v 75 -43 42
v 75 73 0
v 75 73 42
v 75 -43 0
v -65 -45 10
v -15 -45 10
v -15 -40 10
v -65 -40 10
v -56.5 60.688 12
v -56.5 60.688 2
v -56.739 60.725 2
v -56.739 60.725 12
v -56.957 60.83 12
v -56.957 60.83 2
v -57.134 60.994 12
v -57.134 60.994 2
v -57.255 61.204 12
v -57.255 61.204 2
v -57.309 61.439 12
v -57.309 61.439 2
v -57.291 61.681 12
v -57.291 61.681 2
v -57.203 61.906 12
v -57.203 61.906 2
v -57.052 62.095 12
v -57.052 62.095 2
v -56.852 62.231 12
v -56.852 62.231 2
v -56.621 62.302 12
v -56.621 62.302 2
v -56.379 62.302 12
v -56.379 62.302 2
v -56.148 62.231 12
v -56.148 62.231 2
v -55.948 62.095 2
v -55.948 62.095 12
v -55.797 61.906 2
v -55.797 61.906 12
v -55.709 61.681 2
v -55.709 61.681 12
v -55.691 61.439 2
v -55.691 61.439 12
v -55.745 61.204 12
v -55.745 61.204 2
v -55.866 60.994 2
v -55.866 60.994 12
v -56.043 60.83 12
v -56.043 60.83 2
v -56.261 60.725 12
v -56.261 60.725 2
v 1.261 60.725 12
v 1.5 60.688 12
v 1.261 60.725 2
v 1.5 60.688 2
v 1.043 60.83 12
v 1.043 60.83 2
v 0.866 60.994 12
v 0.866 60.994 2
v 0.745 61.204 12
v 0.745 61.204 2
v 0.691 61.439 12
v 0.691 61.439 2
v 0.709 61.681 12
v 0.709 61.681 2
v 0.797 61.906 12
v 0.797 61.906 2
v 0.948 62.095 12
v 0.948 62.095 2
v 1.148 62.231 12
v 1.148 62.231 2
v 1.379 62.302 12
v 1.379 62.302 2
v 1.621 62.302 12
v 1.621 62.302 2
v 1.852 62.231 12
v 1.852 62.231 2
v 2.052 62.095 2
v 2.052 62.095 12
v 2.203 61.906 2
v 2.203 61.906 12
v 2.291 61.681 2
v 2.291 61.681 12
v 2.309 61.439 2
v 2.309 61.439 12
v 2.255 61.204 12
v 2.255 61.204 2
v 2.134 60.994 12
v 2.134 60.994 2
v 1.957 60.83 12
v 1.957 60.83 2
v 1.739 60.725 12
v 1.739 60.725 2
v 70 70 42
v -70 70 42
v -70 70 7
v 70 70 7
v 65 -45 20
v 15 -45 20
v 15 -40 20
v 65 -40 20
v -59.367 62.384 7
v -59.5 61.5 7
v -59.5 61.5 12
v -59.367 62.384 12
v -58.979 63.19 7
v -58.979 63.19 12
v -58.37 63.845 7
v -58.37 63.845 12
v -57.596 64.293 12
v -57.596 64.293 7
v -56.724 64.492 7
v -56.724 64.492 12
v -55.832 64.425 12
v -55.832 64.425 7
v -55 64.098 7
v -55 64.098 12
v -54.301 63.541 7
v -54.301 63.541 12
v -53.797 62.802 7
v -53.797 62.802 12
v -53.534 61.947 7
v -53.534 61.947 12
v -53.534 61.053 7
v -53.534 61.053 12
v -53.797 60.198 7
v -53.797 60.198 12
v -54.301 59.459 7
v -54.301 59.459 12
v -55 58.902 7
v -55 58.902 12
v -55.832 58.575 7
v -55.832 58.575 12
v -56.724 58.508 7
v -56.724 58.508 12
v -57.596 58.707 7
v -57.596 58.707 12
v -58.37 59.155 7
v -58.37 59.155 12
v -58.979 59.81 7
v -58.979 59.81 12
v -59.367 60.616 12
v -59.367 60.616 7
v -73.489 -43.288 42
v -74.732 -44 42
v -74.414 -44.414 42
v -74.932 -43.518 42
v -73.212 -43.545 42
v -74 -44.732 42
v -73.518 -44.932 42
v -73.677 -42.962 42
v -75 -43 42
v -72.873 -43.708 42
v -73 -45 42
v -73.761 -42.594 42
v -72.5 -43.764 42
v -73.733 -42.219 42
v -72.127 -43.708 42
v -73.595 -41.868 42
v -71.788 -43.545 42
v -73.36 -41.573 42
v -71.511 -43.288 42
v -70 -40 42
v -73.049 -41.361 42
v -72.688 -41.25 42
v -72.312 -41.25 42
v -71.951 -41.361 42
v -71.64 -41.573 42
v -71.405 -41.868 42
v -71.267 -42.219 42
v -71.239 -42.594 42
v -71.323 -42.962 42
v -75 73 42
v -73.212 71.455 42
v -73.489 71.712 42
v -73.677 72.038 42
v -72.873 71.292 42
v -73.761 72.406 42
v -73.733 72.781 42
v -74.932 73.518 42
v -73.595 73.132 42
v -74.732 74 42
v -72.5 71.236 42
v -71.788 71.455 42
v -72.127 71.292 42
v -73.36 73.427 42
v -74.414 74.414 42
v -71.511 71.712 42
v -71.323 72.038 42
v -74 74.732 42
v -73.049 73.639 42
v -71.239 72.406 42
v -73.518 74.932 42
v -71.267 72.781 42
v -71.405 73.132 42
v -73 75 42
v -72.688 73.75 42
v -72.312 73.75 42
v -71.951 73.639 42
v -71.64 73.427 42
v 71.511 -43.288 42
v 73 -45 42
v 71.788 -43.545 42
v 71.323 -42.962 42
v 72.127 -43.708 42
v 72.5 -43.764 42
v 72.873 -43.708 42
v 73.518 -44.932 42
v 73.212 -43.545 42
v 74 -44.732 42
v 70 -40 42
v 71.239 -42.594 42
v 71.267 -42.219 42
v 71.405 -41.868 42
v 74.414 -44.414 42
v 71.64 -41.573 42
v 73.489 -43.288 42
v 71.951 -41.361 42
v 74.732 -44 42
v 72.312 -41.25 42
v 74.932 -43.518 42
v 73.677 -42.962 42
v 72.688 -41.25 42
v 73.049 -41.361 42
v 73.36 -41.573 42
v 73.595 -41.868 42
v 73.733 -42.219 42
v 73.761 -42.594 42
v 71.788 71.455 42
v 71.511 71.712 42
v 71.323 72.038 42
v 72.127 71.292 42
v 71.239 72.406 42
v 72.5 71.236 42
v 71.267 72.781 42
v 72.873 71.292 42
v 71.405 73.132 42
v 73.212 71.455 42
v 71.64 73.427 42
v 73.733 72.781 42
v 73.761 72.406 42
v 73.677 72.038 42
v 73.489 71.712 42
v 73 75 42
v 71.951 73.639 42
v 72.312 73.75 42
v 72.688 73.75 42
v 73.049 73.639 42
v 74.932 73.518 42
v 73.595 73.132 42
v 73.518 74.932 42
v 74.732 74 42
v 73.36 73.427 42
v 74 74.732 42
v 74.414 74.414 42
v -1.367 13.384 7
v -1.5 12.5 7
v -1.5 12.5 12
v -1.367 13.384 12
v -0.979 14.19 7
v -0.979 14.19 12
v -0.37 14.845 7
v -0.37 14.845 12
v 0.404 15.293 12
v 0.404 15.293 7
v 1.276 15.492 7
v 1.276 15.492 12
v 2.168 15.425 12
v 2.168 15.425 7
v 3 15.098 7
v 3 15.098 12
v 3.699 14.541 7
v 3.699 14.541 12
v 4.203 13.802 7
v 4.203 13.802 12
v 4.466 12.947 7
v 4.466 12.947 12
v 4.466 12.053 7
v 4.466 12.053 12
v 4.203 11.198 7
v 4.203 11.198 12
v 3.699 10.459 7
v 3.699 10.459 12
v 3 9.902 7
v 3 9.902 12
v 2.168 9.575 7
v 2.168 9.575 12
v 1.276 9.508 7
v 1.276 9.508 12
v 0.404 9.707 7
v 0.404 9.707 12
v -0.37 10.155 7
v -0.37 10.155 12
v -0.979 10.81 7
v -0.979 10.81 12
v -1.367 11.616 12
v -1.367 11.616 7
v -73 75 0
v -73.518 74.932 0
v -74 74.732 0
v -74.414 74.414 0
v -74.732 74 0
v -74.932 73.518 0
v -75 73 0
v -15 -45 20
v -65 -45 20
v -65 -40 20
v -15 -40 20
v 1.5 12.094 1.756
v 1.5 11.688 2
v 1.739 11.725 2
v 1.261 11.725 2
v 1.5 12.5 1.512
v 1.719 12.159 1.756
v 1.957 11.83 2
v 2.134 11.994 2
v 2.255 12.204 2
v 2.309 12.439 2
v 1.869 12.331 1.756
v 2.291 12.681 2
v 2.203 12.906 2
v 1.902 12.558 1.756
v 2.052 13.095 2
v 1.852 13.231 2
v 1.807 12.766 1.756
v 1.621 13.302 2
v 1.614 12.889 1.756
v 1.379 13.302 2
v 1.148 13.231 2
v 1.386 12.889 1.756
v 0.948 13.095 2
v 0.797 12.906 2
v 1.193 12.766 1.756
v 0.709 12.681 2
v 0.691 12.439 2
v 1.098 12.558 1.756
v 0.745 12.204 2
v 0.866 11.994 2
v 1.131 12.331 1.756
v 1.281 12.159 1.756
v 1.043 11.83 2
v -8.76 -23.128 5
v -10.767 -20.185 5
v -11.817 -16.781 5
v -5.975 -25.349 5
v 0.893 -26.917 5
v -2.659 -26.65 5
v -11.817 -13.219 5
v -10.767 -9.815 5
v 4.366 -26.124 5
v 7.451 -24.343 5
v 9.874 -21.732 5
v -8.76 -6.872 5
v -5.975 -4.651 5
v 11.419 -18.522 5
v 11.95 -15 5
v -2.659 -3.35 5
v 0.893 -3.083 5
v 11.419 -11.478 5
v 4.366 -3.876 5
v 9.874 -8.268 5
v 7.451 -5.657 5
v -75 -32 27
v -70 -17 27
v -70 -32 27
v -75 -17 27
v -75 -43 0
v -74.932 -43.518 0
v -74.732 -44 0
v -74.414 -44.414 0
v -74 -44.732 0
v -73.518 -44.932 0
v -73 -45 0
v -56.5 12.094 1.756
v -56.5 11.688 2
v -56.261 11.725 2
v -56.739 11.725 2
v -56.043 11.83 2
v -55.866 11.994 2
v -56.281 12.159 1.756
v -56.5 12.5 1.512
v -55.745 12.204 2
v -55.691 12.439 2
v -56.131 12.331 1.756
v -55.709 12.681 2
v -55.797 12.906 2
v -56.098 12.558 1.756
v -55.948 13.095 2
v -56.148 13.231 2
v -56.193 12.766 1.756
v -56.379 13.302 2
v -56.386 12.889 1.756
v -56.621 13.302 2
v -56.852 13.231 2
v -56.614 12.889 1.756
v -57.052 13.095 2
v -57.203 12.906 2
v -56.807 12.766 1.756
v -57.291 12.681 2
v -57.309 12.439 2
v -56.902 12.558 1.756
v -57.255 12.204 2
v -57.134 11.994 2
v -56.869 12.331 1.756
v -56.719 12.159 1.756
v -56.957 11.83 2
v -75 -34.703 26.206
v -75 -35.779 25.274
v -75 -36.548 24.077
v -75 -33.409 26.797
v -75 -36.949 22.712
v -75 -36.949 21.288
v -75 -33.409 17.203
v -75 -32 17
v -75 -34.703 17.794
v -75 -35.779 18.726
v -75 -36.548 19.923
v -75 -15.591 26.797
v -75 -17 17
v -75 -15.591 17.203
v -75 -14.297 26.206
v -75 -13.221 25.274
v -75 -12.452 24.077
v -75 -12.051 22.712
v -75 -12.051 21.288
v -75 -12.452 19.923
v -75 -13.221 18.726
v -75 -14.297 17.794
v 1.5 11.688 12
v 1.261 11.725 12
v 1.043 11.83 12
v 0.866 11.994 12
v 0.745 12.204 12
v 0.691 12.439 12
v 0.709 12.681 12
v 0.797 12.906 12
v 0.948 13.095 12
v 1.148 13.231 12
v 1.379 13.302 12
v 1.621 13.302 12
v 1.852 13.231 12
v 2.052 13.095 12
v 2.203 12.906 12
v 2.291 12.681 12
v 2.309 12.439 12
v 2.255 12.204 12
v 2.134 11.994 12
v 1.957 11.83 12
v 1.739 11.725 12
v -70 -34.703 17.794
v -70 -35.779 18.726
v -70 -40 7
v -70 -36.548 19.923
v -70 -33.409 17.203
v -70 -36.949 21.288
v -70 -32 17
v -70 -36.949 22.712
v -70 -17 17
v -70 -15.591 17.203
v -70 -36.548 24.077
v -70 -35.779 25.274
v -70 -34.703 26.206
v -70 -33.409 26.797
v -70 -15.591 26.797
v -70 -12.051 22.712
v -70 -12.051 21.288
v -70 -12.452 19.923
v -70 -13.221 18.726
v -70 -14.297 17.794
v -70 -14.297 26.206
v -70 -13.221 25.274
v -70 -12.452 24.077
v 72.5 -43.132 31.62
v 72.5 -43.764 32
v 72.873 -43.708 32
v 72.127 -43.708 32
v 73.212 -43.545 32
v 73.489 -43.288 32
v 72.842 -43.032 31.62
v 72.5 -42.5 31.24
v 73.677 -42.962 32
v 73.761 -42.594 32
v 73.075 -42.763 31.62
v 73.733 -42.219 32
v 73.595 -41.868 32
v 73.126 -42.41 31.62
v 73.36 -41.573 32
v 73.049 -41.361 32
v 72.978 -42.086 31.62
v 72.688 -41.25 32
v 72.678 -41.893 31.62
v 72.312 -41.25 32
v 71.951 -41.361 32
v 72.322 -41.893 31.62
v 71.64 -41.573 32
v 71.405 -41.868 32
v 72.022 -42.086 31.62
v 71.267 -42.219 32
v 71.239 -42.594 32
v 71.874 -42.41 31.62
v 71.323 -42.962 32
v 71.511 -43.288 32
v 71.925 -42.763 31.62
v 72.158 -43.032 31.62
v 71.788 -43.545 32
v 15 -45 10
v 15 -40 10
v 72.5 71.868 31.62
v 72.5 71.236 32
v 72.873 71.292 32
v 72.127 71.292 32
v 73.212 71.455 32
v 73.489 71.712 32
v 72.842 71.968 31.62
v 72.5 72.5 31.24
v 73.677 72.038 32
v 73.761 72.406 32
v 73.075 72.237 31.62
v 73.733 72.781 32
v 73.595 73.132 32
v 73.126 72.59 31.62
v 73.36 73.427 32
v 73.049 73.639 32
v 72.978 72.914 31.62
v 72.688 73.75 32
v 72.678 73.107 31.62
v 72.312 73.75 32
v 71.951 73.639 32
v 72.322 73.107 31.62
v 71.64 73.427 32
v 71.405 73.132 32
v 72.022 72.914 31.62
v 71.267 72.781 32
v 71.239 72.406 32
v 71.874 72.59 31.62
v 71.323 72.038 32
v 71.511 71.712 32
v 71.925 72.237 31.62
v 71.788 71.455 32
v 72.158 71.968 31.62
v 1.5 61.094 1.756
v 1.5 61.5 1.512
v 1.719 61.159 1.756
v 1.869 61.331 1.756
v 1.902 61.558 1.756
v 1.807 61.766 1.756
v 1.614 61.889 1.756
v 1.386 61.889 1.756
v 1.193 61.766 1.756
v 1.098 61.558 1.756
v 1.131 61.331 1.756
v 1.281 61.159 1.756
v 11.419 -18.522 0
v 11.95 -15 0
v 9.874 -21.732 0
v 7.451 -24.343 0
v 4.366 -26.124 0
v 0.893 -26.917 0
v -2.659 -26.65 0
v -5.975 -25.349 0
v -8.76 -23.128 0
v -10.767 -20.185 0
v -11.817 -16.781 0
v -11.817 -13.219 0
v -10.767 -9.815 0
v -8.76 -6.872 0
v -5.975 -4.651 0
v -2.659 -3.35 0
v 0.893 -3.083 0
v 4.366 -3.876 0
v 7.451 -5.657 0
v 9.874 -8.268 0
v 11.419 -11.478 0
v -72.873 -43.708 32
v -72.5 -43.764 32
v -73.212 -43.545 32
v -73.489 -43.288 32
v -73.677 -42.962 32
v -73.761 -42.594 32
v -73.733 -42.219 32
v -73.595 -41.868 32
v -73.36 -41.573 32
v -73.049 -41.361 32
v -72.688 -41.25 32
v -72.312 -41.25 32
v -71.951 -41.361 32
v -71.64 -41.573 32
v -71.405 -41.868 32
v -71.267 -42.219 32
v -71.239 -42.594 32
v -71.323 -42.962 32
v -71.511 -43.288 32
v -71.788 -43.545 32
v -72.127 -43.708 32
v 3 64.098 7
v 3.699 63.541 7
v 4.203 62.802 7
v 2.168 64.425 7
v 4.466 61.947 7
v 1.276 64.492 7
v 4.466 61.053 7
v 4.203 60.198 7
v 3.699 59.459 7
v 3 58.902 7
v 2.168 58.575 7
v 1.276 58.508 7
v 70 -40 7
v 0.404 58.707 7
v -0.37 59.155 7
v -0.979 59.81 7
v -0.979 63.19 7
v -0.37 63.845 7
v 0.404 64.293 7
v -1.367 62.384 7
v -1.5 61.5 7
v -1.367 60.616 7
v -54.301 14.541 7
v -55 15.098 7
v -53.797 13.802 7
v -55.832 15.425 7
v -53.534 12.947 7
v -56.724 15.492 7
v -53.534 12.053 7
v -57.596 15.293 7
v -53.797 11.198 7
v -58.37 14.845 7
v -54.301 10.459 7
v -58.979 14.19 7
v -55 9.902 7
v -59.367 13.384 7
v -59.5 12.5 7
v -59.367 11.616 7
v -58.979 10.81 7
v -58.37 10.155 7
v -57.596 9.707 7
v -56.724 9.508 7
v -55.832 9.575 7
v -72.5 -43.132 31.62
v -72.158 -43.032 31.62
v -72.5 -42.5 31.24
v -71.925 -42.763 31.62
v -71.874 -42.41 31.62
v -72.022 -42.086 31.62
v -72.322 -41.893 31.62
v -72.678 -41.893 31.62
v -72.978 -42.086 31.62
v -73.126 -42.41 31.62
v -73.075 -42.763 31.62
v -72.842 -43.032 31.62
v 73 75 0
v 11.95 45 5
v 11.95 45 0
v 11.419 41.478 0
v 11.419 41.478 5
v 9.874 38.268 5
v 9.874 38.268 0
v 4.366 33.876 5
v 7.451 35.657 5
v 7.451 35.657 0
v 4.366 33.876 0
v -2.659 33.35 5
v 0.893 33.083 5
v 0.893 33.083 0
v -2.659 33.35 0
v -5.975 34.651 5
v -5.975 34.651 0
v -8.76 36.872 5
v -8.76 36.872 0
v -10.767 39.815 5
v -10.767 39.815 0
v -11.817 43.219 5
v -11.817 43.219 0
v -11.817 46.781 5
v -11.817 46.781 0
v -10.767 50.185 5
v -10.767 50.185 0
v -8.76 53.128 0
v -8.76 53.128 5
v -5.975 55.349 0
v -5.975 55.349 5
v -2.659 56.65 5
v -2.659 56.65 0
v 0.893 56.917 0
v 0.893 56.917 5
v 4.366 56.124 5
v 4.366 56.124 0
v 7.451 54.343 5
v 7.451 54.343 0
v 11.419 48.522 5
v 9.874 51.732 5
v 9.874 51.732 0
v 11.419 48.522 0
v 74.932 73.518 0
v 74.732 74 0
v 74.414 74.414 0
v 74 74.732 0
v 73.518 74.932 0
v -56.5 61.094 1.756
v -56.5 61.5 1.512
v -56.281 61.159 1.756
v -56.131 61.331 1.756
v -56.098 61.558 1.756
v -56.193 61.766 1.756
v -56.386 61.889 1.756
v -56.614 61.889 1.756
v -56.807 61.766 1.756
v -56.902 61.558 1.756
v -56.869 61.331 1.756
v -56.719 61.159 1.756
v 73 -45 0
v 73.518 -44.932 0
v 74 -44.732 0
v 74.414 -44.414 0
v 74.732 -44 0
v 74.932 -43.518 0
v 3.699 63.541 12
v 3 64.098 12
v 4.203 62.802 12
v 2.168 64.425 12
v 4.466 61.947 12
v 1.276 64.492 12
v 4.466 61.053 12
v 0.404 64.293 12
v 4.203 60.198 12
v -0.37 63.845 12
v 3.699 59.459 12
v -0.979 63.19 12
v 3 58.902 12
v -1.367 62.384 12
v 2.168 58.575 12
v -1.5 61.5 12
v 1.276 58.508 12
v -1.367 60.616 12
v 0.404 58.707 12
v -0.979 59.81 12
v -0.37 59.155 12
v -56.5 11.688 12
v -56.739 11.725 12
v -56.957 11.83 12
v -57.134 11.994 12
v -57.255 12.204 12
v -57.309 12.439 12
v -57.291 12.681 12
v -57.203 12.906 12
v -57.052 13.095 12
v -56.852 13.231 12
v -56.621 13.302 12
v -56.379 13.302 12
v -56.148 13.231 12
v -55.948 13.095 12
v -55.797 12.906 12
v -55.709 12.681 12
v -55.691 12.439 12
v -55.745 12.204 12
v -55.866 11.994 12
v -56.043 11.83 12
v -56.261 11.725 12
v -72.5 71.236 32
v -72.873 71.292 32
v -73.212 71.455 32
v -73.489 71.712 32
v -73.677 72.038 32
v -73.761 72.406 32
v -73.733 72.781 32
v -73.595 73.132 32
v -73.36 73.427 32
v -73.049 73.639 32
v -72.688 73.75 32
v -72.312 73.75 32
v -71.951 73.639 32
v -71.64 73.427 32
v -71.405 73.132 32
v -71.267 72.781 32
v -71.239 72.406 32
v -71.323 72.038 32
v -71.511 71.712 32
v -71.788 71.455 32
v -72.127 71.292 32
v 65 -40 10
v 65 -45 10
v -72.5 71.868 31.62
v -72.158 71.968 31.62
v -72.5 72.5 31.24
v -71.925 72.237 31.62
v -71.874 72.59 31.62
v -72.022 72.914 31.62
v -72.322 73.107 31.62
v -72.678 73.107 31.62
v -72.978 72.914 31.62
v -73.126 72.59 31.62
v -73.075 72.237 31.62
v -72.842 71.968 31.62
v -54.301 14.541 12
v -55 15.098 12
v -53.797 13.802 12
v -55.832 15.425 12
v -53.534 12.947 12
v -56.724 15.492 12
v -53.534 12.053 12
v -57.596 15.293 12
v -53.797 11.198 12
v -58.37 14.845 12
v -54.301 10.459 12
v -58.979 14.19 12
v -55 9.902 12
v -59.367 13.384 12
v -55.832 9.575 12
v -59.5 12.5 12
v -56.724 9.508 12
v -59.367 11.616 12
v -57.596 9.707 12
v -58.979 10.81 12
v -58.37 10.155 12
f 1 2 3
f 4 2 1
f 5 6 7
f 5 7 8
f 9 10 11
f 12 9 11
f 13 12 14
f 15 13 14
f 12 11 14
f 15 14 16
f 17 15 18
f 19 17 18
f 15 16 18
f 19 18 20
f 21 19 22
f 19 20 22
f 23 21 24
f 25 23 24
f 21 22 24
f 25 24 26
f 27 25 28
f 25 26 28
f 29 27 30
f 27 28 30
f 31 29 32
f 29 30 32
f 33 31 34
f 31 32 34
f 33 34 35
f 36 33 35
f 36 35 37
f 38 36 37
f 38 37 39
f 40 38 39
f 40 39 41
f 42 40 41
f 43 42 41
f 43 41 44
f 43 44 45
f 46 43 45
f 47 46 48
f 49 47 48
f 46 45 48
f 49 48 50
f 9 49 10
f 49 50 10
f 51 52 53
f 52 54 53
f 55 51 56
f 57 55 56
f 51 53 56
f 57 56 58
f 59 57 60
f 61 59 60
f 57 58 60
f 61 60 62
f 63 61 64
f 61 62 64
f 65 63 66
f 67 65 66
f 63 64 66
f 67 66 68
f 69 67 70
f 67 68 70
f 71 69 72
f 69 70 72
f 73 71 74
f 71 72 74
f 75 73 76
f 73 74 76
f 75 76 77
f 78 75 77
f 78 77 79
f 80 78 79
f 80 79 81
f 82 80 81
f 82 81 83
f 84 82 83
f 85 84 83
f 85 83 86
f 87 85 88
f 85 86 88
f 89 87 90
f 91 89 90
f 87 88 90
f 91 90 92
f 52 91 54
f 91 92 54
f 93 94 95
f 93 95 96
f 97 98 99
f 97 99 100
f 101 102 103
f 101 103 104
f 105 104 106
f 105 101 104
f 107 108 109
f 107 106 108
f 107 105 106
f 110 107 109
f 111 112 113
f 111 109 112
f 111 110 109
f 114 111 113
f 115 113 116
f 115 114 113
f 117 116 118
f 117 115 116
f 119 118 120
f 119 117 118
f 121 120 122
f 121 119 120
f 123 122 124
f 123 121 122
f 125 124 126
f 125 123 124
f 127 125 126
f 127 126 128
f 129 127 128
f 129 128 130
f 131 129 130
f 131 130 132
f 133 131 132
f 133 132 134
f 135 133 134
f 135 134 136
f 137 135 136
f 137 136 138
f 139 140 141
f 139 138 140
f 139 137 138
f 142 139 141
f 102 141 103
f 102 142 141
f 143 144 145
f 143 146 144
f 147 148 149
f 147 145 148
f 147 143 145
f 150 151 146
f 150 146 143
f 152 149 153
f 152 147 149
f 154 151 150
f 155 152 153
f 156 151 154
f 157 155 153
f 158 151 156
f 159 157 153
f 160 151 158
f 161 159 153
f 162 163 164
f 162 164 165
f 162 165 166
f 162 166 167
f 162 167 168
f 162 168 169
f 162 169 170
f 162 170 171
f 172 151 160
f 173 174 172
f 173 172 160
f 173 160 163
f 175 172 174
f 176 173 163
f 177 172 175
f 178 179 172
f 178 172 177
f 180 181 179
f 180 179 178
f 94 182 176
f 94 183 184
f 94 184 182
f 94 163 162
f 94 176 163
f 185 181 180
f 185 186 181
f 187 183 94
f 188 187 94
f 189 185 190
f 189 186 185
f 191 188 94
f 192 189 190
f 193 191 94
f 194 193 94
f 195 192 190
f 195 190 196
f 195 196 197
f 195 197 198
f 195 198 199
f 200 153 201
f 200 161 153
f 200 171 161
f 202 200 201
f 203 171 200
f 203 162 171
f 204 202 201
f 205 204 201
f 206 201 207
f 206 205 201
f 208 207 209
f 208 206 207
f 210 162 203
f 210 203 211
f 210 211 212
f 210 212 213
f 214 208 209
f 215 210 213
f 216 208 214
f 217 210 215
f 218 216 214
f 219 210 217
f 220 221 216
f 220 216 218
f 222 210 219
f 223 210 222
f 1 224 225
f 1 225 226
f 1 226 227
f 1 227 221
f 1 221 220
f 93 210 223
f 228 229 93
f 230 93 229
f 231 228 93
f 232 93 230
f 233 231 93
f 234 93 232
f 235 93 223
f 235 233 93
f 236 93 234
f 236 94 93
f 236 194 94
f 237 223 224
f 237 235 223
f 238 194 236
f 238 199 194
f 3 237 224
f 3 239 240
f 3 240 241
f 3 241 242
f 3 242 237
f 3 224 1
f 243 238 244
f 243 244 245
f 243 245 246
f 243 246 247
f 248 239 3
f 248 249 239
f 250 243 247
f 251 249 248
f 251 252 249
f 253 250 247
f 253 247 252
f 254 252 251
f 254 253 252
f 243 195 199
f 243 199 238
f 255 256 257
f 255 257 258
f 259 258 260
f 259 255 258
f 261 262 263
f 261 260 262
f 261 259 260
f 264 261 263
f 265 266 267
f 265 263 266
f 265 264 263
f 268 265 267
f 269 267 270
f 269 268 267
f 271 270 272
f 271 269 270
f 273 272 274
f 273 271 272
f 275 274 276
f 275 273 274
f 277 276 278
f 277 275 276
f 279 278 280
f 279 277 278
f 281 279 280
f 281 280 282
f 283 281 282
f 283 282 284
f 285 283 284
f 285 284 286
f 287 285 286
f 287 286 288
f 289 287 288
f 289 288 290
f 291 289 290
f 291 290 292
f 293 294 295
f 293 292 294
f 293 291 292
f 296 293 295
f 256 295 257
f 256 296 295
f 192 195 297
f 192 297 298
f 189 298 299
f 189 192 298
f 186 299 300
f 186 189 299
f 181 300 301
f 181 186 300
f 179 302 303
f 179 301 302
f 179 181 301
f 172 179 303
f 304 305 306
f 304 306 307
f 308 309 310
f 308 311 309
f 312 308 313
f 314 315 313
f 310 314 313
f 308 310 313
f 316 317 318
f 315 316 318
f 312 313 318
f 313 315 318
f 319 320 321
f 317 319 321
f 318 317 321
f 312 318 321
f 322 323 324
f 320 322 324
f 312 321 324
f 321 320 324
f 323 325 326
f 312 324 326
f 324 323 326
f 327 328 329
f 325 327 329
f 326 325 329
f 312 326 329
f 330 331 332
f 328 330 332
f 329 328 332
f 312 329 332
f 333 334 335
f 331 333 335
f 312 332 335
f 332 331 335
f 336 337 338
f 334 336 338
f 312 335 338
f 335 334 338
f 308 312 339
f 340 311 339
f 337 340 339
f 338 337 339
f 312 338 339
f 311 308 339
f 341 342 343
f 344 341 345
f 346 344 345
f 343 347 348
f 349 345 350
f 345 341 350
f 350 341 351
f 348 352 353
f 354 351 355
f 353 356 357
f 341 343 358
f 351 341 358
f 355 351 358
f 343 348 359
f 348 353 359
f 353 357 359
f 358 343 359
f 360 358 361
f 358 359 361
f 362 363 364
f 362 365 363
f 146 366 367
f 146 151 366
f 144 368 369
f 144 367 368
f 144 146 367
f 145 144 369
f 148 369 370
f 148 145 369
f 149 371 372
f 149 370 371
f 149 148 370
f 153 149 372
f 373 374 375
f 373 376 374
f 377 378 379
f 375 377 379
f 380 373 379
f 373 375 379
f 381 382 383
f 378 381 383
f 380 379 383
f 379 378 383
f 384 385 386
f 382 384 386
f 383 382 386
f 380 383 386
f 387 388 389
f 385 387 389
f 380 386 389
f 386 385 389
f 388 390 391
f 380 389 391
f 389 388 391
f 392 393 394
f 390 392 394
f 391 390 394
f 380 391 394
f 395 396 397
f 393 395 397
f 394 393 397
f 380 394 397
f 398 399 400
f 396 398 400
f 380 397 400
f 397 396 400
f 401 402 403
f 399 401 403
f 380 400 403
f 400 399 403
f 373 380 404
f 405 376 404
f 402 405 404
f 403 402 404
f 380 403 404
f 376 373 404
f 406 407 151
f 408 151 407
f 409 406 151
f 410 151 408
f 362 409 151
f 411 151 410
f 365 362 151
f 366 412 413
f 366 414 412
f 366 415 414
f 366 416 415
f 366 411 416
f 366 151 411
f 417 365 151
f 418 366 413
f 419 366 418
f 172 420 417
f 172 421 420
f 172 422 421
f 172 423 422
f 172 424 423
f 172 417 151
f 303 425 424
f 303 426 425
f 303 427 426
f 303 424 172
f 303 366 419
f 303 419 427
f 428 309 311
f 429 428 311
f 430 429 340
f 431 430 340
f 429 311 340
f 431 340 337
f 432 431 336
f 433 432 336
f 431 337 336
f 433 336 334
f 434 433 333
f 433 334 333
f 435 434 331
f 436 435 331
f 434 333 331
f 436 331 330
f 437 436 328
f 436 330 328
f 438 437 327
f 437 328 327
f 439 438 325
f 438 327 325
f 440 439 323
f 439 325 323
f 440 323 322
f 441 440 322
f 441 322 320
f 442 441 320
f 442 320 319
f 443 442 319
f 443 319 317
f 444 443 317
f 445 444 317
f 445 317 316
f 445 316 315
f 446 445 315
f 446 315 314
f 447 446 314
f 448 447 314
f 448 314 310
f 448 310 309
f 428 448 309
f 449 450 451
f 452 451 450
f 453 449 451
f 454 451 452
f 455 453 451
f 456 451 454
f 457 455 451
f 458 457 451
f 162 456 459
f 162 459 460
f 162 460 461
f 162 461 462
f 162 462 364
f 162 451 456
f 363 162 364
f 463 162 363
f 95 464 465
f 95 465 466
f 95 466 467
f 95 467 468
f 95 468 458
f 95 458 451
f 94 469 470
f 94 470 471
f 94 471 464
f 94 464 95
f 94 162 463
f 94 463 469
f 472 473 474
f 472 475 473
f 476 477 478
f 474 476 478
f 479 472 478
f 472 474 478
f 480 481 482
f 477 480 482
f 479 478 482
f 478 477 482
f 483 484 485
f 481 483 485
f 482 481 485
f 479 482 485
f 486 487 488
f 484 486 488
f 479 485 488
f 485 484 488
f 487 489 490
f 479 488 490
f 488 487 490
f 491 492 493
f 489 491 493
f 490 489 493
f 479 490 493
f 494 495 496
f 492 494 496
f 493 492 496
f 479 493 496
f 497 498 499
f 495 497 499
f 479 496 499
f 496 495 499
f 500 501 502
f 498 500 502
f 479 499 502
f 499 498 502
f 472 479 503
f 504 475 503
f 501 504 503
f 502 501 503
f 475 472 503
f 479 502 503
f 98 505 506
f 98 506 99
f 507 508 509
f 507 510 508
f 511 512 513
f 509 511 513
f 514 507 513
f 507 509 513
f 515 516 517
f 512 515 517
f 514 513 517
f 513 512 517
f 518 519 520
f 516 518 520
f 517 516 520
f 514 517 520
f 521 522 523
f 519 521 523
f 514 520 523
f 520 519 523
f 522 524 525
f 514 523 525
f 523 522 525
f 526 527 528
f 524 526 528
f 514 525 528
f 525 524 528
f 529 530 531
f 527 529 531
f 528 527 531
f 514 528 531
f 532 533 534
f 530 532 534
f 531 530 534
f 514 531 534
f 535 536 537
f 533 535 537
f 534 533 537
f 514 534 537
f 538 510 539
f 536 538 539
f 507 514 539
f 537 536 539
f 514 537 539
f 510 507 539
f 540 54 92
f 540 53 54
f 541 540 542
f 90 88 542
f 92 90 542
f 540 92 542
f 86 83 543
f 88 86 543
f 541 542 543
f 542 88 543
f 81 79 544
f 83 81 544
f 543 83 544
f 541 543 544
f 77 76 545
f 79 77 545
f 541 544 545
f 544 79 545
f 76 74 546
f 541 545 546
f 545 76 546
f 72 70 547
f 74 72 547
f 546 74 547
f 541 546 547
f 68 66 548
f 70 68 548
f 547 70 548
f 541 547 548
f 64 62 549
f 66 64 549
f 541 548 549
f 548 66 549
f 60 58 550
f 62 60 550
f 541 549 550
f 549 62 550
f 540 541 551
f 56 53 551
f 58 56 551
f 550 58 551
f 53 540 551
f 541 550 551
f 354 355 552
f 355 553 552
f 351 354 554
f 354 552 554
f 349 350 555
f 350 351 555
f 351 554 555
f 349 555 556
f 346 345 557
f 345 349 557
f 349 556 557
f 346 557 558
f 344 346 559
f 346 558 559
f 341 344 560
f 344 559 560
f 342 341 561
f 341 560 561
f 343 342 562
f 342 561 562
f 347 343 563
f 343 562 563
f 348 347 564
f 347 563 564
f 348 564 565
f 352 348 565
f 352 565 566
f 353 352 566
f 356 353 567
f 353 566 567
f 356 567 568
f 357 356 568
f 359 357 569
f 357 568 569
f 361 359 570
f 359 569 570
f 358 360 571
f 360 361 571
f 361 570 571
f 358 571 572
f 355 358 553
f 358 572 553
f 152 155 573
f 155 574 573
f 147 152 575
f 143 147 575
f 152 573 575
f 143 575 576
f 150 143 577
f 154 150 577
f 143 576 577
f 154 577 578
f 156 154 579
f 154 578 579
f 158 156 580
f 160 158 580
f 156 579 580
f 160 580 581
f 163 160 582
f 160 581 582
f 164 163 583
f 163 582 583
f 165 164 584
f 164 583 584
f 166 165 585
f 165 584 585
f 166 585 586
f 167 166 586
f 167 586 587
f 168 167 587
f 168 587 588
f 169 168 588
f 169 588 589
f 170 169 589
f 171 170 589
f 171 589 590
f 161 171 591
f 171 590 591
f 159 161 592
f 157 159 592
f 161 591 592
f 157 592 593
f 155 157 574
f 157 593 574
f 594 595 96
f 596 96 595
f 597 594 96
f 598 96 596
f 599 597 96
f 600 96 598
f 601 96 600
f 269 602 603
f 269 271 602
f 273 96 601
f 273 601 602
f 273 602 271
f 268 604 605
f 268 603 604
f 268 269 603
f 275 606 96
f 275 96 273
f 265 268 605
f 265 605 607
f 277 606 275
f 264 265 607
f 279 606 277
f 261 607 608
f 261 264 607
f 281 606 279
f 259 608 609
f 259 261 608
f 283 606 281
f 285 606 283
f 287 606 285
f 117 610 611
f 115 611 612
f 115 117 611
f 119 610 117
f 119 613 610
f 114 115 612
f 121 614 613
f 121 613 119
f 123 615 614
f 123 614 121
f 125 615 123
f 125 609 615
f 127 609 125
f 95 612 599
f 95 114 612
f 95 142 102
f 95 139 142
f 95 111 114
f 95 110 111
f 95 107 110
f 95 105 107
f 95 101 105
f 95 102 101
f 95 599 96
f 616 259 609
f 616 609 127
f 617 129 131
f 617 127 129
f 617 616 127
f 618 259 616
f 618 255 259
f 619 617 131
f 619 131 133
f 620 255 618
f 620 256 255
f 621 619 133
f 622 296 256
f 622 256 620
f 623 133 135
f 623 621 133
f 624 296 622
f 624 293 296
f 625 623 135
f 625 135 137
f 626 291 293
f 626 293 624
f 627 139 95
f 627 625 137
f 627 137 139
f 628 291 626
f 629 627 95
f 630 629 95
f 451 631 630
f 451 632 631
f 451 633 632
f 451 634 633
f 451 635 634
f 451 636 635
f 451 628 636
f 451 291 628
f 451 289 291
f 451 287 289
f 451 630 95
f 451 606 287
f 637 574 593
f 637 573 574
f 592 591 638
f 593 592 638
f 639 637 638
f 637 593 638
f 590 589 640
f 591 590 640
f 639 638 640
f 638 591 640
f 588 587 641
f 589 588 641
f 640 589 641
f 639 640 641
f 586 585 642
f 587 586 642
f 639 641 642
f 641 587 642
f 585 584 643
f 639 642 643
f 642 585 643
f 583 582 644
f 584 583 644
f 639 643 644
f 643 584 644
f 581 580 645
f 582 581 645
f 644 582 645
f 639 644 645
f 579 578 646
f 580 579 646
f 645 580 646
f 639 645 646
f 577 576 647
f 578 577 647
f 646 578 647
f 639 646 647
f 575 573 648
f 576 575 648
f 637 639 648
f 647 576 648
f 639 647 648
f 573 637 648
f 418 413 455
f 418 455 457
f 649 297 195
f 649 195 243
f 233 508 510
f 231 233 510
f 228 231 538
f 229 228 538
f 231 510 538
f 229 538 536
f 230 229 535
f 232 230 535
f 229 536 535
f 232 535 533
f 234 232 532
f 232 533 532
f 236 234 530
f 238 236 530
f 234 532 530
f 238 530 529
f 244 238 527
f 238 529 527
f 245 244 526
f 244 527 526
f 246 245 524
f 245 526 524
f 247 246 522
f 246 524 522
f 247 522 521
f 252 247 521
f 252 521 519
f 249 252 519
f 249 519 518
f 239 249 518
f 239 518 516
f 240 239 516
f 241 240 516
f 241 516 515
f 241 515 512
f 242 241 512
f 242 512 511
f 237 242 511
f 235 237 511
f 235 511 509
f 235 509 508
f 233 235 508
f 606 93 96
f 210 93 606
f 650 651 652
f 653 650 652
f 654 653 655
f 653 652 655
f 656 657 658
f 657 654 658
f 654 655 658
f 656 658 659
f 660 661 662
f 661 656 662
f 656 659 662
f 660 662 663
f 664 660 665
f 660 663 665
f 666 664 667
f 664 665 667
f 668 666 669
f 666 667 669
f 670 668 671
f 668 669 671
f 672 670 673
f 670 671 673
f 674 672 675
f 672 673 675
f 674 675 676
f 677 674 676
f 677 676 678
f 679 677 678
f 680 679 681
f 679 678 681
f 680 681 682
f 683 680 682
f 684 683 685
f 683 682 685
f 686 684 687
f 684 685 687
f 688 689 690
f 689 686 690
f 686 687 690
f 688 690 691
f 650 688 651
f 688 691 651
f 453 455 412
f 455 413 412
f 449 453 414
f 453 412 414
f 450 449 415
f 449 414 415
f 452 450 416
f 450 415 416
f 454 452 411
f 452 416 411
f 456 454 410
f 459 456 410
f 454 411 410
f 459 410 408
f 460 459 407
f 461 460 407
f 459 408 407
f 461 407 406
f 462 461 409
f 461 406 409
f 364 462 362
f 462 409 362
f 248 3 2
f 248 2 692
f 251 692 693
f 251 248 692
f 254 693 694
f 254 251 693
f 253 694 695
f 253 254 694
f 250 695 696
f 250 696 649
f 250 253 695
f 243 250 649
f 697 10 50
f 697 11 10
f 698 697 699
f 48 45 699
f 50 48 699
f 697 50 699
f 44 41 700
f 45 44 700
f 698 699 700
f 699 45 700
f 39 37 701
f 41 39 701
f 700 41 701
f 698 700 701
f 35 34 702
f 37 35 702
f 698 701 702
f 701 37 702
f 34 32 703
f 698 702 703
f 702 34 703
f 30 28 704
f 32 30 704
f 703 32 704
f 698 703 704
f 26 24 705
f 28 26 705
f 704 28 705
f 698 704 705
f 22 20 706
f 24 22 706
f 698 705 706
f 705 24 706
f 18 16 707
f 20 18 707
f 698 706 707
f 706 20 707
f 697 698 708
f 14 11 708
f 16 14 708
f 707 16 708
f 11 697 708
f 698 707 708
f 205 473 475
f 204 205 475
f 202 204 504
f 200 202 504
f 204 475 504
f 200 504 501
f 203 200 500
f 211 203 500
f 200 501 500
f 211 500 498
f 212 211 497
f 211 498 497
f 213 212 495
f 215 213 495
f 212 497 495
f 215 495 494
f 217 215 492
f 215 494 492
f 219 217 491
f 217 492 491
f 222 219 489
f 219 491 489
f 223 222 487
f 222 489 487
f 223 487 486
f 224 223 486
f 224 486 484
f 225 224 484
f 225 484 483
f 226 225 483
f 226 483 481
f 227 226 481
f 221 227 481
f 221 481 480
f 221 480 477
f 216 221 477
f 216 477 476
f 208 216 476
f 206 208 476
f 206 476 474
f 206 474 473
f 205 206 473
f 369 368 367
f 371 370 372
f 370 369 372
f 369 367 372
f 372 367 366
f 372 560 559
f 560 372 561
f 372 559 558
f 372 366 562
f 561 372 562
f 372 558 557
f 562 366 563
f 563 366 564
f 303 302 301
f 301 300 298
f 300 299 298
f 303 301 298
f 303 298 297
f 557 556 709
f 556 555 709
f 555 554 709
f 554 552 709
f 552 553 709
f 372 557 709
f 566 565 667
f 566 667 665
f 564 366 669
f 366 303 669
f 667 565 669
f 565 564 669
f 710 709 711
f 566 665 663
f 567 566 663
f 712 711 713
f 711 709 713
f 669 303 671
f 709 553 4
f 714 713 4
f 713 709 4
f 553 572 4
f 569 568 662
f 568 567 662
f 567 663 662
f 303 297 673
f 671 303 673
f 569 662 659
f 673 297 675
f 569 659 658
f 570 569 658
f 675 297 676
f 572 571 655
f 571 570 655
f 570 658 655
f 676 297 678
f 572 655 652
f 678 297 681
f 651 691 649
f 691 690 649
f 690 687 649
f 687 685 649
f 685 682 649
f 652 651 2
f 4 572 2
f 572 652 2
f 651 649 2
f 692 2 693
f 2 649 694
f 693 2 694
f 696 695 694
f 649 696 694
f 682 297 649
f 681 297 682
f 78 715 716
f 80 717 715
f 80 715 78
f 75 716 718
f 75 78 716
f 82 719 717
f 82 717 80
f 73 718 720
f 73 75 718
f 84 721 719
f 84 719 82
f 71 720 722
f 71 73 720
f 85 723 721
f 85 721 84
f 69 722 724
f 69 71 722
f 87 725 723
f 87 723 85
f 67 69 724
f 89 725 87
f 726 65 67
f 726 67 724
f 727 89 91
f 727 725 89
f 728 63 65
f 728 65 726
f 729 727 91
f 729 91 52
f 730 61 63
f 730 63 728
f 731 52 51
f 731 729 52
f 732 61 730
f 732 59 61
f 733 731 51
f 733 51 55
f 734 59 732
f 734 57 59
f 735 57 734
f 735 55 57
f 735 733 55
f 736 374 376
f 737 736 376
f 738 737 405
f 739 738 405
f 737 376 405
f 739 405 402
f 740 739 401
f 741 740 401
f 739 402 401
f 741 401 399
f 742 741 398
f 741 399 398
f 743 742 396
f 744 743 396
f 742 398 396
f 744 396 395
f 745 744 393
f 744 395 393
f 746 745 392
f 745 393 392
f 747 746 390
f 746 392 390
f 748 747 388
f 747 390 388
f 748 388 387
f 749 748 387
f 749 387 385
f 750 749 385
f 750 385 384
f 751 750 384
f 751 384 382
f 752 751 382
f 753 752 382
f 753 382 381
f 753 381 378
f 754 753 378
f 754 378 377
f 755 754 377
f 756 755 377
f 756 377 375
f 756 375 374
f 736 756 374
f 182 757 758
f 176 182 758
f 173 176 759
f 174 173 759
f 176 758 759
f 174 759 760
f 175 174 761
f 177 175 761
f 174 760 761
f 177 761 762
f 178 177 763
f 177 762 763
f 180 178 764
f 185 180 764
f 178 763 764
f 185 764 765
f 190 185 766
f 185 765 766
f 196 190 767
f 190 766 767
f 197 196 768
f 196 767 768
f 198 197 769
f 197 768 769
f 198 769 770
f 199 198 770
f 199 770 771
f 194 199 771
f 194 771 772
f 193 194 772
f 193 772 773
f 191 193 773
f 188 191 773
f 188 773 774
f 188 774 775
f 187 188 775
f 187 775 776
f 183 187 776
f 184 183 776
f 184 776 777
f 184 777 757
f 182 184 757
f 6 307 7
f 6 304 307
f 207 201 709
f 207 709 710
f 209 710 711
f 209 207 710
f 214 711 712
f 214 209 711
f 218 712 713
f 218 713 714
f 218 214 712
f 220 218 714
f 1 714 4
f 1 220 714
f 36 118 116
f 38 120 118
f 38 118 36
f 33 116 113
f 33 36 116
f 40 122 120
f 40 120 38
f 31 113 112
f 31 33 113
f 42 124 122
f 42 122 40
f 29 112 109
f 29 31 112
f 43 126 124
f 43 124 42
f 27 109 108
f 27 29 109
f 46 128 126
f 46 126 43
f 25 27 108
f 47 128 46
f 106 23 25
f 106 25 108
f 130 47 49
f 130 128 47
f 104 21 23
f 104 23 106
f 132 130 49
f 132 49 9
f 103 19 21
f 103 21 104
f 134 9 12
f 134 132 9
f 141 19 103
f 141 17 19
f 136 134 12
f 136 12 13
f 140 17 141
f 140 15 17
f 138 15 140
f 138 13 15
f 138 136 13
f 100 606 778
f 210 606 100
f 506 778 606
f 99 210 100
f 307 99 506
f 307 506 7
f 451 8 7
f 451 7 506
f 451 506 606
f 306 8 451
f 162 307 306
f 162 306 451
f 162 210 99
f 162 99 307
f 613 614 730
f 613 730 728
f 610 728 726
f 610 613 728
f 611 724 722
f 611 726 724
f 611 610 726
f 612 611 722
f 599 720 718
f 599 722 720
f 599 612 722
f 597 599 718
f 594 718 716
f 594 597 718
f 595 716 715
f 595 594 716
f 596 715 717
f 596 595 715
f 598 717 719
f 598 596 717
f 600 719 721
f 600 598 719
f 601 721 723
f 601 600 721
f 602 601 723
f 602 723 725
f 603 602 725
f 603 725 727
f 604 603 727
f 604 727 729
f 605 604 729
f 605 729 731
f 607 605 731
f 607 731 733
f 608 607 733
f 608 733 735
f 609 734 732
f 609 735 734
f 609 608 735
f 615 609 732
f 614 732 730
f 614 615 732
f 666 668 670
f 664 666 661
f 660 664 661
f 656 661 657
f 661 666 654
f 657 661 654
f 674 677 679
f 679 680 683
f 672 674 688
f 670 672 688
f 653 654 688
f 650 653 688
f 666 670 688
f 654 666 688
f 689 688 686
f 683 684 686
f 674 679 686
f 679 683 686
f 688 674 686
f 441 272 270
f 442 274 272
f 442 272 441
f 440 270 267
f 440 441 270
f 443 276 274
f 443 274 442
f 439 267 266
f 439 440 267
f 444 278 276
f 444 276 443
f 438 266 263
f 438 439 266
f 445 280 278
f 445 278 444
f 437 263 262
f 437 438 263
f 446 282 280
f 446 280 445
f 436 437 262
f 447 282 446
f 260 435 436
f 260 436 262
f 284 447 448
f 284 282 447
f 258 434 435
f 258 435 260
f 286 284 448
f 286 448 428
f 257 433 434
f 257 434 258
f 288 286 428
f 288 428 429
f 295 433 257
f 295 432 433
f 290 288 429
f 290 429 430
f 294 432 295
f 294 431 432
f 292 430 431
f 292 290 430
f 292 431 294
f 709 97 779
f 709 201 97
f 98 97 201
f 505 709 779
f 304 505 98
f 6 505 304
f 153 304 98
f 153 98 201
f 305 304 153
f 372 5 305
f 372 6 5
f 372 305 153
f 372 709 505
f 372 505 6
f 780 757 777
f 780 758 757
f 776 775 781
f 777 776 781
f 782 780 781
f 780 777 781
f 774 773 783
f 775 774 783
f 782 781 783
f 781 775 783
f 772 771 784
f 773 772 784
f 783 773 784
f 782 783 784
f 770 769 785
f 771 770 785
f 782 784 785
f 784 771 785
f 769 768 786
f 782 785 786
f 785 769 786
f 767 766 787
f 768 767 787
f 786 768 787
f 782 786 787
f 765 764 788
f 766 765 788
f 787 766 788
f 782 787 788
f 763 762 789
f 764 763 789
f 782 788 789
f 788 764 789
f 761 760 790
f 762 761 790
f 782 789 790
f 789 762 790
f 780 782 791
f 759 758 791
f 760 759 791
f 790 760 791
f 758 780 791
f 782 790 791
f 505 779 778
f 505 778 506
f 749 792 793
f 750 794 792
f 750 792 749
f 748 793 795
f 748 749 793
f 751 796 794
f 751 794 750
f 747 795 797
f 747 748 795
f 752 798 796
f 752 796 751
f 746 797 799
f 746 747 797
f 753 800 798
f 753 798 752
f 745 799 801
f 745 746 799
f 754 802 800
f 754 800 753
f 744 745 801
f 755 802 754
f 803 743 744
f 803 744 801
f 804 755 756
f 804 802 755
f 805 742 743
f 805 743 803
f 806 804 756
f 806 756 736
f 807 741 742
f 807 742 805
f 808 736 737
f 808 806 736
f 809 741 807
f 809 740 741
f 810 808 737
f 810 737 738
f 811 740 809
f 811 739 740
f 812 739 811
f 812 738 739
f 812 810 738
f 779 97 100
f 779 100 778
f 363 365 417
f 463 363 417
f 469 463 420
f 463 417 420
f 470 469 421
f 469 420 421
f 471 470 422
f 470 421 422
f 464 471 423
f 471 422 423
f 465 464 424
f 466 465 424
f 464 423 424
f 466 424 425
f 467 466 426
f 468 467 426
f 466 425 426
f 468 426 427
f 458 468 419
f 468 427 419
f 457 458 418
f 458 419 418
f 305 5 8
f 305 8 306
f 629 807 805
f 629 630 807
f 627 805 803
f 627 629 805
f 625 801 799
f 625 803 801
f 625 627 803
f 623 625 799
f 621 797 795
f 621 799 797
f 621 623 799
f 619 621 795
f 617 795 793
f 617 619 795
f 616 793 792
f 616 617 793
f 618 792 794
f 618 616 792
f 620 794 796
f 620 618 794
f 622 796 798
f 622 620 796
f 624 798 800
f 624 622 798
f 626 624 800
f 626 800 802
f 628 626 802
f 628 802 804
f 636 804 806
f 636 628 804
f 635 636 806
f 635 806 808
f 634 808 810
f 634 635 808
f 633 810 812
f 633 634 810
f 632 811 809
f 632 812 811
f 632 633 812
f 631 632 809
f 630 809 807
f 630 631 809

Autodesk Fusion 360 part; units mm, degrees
sketch "スケッチ6" plane through (0, 0, 0) normal (0, 0, 1) x (1, 0, 0)
  line L0 (75, -45) -> (-75, -45)
  line L1 (-75, -45) -> (-75, 75)
  line L2 (-75, 75) -> (75, 75)
  line L3 (75, 75) -> (75, -45)
  line L4 (-200, 0) -> (160, 0)
  dimension "d22" = 150
  dimension "d110" = 75
  dimension "d111" = 45
extrude "押し出し4" add sketch "スケッチ6" along normal blind 42
sketch "スケッチ7" plane through (0, 0, 42) normal (0, 0, 1) x (-1, 0, 0)
  line L0 (-75, -75) -> (75, -75)
  line L1 (75, -75) -> (75, 45)
  line L2 (75, 45) -> (-75, 45)
  line L3 (-75, 45) -> (-75, -75)
  line L4 (70, -70) -> (-70, -70)
  line L5 (-70, -70) -> (-70, 40)
  line L6 (-70, 40) -> (70, 40)
  line L7 (70, 40) -> (70, -70)
  dimension "d26" = 5
  dimension "d27" = 5
extrude "押し出し5" cut sketch "スケッチ7" against normal blind 35 contours L4 L5 L6 L7
sketch "スケッチ8" plane through (0, 0, 7) normal (0, 0, 1) x (-1, 0, 0)
  line L0 (70, 40) -> (-70, 40)
  line L1 (-70, 40) -> (-70, -70)
  line L2 (-70, -70) -> (70, -70)
  line L3 (70, -70) -> (70, 40)
  circle A0 centre (56.5, -61.5) radius 3
  circle A1 centre (-1.5, -61.5) radius 3
  circle A2 centre (56.5, -12.5) radius 3
  circle A3 centre (-1.5, -12.5) radius 3
  dimension "d32" = 6
  dimension "d35" = 6
  dimension "d37" = 58
  dimension "d41" = 6
  dimension "d42" = 6
extrude "押し出し6" add sketch "スケッチ8" along normal blind 5 contours A0 | A1 | A2 | A3
sketch "スケッチ9" plane through (0, 0, 12) normal (0, 0, 1) x (-1, 0, 0)
  circle A0 centre (56.5, -61.5) radius 3
  line L0 (56.5, -61.5) -> (53.5, -61.5)
  line L1 (56.5, -61.5) -> (56.5, -64.5)
hole "穴1" at (-56.5, 61.5, 12) direction (0, 0, -1) diameter 1.623 depth 10 tip angle 118
sketch "スケッチ10" plane through (0, 0, 12) normal (0, 0, 1) x (-1, 0, 0)
  circle A0 centre (-1.5, -61.5) radius 3
  line L0 (-1.5, -61.5) -> (-3.2909, -61.5)
  line L1 (-3.2909, -61.5) -> (-1.5, -61.5)
  line L2 (-1.5, -61.5) -> (-1.5, -64)
hole "穴2" at (1.5, 61.5, 12) direction (0, 0, -1) diameter 1.623 depth 10 tip angle 118
sketch "スケッチ11" plane through (0, 0, 12) normal (0, 0, 1) x (-1, 0, 0)
  circle A0 centre (-1.5, -12.5) radius 3
  line L0 (-1.5, -12.5) -> (-4.5, -12.5)
  line L1 (-1.5, -12.5) -> (-1.5, -15.5)
hole "穴3" at (1.5, 12.5, 12) direction (0, 0, -1) diameter 1.623 depth 10 tip angle 118
sketch "スケッチ12" plane through (0, 0, 12) normal (0, 0, 1) x (-1, 0, 0)
  circle A0 centre (56.5, -12.5) radius 3
  line L0 (56.5, -12.5) -> (53.5, -12.5)
  line L1 (56.5, -12.5) -> (56.5, -15.5)
hole "穴4" at (-56.5, 12.5, 12) direction (0, 0, -1) diameter 1.623 depth 10 tip angle 118
sketch "スケッチ13" plane through (-75, 0, 0) normal (-1, 0, 0) x (0, -1, 0)
  line L0 (-75, 0) -> (45, 0)
  line L1 (45, 0) -> (45, 42)
  line L2 (45, 42) -> (-75, 42)
  line L3 (-75, 42) -> (-75, 0)
  line L4 (17, 27) -> (32, 27)
  line L5 (32, 17) -> (25.3423, 17)
  arc A0 (32, 17) -> (32, 27) centre (32, 22) ccw
  line L6 (25.3423, 17) -> (17, 17)
  arc A1 (17, 27) -> (17, 17) centre (17, 22) ccw
  dimension "d55" = 15
  dimension "d56" = 10
extrude "押し出し7" cut sketch "スケッチ13" against normal blind 10 contours L4 L5 A0 L6 A1
sketch "スケッチ15" plane through (0, -45, 0) normal (0, -1, 0) x (1, 0, 0)
  line L0 (-75, 0) -> (75, 0)
  line L1 (75, 0) -> (75, 42)
  line L2 (75, 42) -> (-75, 42)
  line L3 (-75, 42) -> (-75, 0)
  line L4 (-15, 10) -> (-65, 10)
  line L5 (-65, 10) -> (-65, 20)
  line L6 (-65, 20) -> (-15, 20)
  line L7 (-15, 20) -> (-15, 10)
  line L8 (15, 20) -> (65, 20)
  line L9 (65, 20) -> (65, 10)
  line L10 (65, 10) -> (15, 10)
  line L11 (15, 10) -> (15, 20)
extrude "押し出し8" cut sketch "スケッチ15" against normal blind 5 contours L4 L5 L6 L7 | L8 L9 L10 L11
sketch "スケッチ16" plane through (0, 0, 42) normal (0, 0, 1) x (-1, 0, 0)
  line L0 (-70, -70) -> (-70, 40)
  line L1 (-70, 40) -> (70, 40)
  line L2 (70, 40) -> (70, -70)
  line L3 (70, -70) -> (-70, -70)
  line L4 (-75, -75) -> (75, -75)
  line L5 (75, -75) -> (75, 45)
  line L6 (75, 45) -> (-75, 45)
  line L7 (-75, 45) -> (-75, -75)
  circle A0 centre (72.5, -72.5) radius 1.5
  circle A1 centre (-72.5, -72.5) radius 1.5
  circle A2 centre (72.5, 72.5) radius 1.5
  circle A3 centre (-72.5, 72.5) radius 1.5
  dimension "d96" = 3
  dimension "d97" = 2.5
  dimension "d98" = 2.5
hole "穴5" at (-72.5, 72.5, 42) at (-72.5, -72.5, 42) at (72.5, 72.5, 42) at (72.5, -72.5, 42) direction (0, 0, -1) diameter 2.529 depth 10 tip angle 118
sketch "スケッチ17" plane through (0, 0, 0) normal (0, 0, 1) x (1, 0, 0)
  circle A0 centre (0, 45) radius 11.95
  circle A1 centre (0, -15) radius 11.95
  line L0 (-75, 75) -> (75, 75)
  line L1 (75, -45) -> (-75, -45)
  dimension "d102" = 23.9
  dimension "d103" = 23.9
  dimension "d104" = 30
  dimension "d105" = 30
extrude "押し出し9" cut sketch "スケッチ17" along normal blind 5
fillet "フィレット1" radius 2 4 edges at (75, -45, 21) (-75, -45, 21) (75, 75, 21) (-75, 75, 21)
sketch "スケッチ18" plane through (0, 0, 42) normal (0, 0, 1) x (-1, 0, 0)
  arc A0 (73, -75) -> (75, -73) centre (73, -73) ccw
  line L0 (75, -73) -> (75, 43)
  arc A1 (75, 43) -> (73, 45) centre (73, 43) ccw
  line L1 (73, 45) -> (-73, 45)
  arc A2 (-73, 45) -> (-75, 43) centre (-73, 43) ccw
  line L2 (-75, 43) -> (-75, -73)
  arc A3 (-75, -73) -> (-73, -75) centre (-73, -73) ccw
  line L3 (-73, -75) -> (73, -75)
  circle A4 centre (-72.5, -72.5) radius 1.2645
  circle A5 centre (72.5, -72.5) radius 1.2645
  line L4 (-70, -70) -> (-70, 40)
  line L5 (-70, 40) -> (70, 40)
  line L6 (70, 40) -> (70, -70)
  line L7 (70, -70) -> (-70, -70)
  circle A6 centre (72.5, 42.5) radius 1
  circle A7 centre (-72.5, 42.5) radius 1
  dimension "d112" = 2
  dimension "d113" = 2.5
  dimension "d114" = 2.5
  dimension "d115" = 2
  dimension "d116" = 2.5
  dimension "d117" = 2.5
hole "穴6" at (-72.5, -42.5, 42) at (72.5, -42.5, 42) direction (0, 0, -1) diameter 2.529 depth 10 tip angle 118
equation "d111 = 75 mm - 30 mm"
